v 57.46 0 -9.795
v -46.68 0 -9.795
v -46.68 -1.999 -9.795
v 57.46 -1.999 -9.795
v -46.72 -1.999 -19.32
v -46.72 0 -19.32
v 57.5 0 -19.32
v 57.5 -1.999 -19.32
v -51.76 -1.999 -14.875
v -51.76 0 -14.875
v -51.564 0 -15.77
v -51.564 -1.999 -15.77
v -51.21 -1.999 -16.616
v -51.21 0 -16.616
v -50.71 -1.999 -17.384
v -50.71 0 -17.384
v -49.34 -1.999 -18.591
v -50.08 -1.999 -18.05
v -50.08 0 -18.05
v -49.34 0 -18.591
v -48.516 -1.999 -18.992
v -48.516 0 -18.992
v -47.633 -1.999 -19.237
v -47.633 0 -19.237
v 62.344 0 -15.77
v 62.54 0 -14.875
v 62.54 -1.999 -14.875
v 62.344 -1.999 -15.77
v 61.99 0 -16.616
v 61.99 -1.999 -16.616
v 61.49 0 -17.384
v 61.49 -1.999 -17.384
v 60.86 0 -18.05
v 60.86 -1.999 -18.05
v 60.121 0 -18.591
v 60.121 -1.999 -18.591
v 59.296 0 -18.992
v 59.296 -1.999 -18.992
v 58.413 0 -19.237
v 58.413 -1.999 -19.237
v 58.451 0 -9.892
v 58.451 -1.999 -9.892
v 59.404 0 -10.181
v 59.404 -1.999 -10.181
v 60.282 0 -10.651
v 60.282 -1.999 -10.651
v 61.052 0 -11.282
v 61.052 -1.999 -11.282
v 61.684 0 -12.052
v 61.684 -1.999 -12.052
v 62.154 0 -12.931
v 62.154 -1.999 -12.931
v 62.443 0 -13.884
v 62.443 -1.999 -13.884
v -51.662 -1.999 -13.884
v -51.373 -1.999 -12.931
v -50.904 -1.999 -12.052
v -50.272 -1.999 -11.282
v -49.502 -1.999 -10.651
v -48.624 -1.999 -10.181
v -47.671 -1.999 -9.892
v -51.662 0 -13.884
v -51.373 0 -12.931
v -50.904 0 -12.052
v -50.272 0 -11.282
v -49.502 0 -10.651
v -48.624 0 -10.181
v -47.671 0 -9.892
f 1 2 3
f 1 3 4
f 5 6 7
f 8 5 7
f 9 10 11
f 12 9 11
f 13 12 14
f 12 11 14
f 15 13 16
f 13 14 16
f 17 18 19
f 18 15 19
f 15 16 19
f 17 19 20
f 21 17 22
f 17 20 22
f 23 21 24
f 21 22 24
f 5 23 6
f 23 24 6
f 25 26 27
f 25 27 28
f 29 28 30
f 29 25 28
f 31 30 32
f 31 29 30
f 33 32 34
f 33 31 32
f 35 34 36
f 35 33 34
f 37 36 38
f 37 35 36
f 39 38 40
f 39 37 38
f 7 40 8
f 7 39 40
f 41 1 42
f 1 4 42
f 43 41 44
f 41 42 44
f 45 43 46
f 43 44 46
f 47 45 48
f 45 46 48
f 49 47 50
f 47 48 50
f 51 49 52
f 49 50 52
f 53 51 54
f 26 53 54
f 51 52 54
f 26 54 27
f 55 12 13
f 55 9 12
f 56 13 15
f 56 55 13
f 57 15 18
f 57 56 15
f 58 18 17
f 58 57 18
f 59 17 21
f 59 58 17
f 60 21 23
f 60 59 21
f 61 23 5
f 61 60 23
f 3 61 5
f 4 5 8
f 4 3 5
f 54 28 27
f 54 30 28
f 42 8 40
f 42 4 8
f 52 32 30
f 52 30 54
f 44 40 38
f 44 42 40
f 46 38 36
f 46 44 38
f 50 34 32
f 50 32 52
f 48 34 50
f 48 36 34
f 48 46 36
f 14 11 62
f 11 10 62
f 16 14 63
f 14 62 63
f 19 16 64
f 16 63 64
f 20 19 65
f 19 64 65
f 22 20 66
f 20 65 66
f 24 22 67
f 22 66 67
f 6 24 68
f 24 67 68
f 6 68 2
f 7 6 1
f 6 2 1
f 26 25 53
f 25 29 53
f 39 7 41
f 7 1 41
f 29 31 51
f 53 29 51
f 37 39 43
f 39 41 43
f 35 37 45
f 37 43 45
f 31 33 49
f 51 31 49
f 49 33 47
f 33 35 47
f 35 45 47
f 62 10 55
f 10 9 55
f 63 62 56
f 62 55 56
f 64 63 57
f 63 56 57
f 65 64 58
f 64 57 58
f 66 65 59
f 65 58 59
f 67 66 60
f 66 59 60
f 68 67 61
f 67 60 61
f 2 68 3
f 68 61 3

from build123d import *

# Parameters (mm, degrees)
F0_W        = 114.3
F0_H        = 9.525
F1_DEPTH    = 1.99898
F2_R        = 5.08
F3_T1_DEPTH = 27.1997612379
F4_R        = 5.08
F5_T1_DEPTH = 27.1997612379


# Not quite as in the source:
# - a fillet or chamfer that OpenCascade refuses, or shapes differently, is made with other operations: its cross-section is extruded or revolved along the edge and cut away or added


with BuildPart() as f1:
    # F0 (on Front) → F1 (new body)
    with BuildSketch(Plane.XZ):
        with Locations((5.390194959, -14.5571018083)):
            Rectangle(F0_W, F0_H)
    extrude(amount=F1_DEPTH)

    # F2
    f2_edges = [f1.edges().sort_by_distance(p)[0] for p in [
        (-51.759805, -0.99949, -9.794602),
    ]]
    fillet(f2_edges, radius=F2_R)

    # F3: fillet of radius 5.08 on 1 edges, made by hand

    # F3_s2 → F3_t1 (cut)
    with BuildSketch(Plane.XZ.offset(-12.6003906189)):
        with BuildLine():
            ThreePointArc((-51.759805041, -14.8746018083), (-50.0797529584, -18.0496018083), (-46.7196487934, -19.3196018083))
            Line((-46.7196487934, -19.3196018083), (-51.759805041, -19.3196018083))
            Line((-51.759805041, -19.3196018083), (-51.759805041, -14.8746018083))
        make_face()
    extrude(amount=F3_T1_DEPTH, mode=Mode.SUBTRACT)

    # F4
    f4_edges = [f1.edges().sort_by_distance(p)[0] for p in [
        (62.540195, -0.99949, -9.794602),
    ]]
    fillet(f4_edges, radius=F4_R)

    # F5: fillet of radius 5.08 on 1 edges, made by hand

    # F5_s2 → F5_t1 (cut)
    with BuildSketch(Plane.XZ.offset(-12.6003906189)):
        with BuildLine():
            ThreePointArc((62.540194959, -14.8746018083), (60.8601428765, -18.0496018083), (57.5000387115, -19.3196018083))
            Line((57.5000387115, -19.3196018083), (62.540194959, -19.3196018083))
            Line((62.540194959, -19.3196018083), (62.540194959, -14.8746018083))
        make_face()
    extrude(amount=F5_T1_DEPTH, mode=Mode.SUBTRACT)


solid = f1.part
